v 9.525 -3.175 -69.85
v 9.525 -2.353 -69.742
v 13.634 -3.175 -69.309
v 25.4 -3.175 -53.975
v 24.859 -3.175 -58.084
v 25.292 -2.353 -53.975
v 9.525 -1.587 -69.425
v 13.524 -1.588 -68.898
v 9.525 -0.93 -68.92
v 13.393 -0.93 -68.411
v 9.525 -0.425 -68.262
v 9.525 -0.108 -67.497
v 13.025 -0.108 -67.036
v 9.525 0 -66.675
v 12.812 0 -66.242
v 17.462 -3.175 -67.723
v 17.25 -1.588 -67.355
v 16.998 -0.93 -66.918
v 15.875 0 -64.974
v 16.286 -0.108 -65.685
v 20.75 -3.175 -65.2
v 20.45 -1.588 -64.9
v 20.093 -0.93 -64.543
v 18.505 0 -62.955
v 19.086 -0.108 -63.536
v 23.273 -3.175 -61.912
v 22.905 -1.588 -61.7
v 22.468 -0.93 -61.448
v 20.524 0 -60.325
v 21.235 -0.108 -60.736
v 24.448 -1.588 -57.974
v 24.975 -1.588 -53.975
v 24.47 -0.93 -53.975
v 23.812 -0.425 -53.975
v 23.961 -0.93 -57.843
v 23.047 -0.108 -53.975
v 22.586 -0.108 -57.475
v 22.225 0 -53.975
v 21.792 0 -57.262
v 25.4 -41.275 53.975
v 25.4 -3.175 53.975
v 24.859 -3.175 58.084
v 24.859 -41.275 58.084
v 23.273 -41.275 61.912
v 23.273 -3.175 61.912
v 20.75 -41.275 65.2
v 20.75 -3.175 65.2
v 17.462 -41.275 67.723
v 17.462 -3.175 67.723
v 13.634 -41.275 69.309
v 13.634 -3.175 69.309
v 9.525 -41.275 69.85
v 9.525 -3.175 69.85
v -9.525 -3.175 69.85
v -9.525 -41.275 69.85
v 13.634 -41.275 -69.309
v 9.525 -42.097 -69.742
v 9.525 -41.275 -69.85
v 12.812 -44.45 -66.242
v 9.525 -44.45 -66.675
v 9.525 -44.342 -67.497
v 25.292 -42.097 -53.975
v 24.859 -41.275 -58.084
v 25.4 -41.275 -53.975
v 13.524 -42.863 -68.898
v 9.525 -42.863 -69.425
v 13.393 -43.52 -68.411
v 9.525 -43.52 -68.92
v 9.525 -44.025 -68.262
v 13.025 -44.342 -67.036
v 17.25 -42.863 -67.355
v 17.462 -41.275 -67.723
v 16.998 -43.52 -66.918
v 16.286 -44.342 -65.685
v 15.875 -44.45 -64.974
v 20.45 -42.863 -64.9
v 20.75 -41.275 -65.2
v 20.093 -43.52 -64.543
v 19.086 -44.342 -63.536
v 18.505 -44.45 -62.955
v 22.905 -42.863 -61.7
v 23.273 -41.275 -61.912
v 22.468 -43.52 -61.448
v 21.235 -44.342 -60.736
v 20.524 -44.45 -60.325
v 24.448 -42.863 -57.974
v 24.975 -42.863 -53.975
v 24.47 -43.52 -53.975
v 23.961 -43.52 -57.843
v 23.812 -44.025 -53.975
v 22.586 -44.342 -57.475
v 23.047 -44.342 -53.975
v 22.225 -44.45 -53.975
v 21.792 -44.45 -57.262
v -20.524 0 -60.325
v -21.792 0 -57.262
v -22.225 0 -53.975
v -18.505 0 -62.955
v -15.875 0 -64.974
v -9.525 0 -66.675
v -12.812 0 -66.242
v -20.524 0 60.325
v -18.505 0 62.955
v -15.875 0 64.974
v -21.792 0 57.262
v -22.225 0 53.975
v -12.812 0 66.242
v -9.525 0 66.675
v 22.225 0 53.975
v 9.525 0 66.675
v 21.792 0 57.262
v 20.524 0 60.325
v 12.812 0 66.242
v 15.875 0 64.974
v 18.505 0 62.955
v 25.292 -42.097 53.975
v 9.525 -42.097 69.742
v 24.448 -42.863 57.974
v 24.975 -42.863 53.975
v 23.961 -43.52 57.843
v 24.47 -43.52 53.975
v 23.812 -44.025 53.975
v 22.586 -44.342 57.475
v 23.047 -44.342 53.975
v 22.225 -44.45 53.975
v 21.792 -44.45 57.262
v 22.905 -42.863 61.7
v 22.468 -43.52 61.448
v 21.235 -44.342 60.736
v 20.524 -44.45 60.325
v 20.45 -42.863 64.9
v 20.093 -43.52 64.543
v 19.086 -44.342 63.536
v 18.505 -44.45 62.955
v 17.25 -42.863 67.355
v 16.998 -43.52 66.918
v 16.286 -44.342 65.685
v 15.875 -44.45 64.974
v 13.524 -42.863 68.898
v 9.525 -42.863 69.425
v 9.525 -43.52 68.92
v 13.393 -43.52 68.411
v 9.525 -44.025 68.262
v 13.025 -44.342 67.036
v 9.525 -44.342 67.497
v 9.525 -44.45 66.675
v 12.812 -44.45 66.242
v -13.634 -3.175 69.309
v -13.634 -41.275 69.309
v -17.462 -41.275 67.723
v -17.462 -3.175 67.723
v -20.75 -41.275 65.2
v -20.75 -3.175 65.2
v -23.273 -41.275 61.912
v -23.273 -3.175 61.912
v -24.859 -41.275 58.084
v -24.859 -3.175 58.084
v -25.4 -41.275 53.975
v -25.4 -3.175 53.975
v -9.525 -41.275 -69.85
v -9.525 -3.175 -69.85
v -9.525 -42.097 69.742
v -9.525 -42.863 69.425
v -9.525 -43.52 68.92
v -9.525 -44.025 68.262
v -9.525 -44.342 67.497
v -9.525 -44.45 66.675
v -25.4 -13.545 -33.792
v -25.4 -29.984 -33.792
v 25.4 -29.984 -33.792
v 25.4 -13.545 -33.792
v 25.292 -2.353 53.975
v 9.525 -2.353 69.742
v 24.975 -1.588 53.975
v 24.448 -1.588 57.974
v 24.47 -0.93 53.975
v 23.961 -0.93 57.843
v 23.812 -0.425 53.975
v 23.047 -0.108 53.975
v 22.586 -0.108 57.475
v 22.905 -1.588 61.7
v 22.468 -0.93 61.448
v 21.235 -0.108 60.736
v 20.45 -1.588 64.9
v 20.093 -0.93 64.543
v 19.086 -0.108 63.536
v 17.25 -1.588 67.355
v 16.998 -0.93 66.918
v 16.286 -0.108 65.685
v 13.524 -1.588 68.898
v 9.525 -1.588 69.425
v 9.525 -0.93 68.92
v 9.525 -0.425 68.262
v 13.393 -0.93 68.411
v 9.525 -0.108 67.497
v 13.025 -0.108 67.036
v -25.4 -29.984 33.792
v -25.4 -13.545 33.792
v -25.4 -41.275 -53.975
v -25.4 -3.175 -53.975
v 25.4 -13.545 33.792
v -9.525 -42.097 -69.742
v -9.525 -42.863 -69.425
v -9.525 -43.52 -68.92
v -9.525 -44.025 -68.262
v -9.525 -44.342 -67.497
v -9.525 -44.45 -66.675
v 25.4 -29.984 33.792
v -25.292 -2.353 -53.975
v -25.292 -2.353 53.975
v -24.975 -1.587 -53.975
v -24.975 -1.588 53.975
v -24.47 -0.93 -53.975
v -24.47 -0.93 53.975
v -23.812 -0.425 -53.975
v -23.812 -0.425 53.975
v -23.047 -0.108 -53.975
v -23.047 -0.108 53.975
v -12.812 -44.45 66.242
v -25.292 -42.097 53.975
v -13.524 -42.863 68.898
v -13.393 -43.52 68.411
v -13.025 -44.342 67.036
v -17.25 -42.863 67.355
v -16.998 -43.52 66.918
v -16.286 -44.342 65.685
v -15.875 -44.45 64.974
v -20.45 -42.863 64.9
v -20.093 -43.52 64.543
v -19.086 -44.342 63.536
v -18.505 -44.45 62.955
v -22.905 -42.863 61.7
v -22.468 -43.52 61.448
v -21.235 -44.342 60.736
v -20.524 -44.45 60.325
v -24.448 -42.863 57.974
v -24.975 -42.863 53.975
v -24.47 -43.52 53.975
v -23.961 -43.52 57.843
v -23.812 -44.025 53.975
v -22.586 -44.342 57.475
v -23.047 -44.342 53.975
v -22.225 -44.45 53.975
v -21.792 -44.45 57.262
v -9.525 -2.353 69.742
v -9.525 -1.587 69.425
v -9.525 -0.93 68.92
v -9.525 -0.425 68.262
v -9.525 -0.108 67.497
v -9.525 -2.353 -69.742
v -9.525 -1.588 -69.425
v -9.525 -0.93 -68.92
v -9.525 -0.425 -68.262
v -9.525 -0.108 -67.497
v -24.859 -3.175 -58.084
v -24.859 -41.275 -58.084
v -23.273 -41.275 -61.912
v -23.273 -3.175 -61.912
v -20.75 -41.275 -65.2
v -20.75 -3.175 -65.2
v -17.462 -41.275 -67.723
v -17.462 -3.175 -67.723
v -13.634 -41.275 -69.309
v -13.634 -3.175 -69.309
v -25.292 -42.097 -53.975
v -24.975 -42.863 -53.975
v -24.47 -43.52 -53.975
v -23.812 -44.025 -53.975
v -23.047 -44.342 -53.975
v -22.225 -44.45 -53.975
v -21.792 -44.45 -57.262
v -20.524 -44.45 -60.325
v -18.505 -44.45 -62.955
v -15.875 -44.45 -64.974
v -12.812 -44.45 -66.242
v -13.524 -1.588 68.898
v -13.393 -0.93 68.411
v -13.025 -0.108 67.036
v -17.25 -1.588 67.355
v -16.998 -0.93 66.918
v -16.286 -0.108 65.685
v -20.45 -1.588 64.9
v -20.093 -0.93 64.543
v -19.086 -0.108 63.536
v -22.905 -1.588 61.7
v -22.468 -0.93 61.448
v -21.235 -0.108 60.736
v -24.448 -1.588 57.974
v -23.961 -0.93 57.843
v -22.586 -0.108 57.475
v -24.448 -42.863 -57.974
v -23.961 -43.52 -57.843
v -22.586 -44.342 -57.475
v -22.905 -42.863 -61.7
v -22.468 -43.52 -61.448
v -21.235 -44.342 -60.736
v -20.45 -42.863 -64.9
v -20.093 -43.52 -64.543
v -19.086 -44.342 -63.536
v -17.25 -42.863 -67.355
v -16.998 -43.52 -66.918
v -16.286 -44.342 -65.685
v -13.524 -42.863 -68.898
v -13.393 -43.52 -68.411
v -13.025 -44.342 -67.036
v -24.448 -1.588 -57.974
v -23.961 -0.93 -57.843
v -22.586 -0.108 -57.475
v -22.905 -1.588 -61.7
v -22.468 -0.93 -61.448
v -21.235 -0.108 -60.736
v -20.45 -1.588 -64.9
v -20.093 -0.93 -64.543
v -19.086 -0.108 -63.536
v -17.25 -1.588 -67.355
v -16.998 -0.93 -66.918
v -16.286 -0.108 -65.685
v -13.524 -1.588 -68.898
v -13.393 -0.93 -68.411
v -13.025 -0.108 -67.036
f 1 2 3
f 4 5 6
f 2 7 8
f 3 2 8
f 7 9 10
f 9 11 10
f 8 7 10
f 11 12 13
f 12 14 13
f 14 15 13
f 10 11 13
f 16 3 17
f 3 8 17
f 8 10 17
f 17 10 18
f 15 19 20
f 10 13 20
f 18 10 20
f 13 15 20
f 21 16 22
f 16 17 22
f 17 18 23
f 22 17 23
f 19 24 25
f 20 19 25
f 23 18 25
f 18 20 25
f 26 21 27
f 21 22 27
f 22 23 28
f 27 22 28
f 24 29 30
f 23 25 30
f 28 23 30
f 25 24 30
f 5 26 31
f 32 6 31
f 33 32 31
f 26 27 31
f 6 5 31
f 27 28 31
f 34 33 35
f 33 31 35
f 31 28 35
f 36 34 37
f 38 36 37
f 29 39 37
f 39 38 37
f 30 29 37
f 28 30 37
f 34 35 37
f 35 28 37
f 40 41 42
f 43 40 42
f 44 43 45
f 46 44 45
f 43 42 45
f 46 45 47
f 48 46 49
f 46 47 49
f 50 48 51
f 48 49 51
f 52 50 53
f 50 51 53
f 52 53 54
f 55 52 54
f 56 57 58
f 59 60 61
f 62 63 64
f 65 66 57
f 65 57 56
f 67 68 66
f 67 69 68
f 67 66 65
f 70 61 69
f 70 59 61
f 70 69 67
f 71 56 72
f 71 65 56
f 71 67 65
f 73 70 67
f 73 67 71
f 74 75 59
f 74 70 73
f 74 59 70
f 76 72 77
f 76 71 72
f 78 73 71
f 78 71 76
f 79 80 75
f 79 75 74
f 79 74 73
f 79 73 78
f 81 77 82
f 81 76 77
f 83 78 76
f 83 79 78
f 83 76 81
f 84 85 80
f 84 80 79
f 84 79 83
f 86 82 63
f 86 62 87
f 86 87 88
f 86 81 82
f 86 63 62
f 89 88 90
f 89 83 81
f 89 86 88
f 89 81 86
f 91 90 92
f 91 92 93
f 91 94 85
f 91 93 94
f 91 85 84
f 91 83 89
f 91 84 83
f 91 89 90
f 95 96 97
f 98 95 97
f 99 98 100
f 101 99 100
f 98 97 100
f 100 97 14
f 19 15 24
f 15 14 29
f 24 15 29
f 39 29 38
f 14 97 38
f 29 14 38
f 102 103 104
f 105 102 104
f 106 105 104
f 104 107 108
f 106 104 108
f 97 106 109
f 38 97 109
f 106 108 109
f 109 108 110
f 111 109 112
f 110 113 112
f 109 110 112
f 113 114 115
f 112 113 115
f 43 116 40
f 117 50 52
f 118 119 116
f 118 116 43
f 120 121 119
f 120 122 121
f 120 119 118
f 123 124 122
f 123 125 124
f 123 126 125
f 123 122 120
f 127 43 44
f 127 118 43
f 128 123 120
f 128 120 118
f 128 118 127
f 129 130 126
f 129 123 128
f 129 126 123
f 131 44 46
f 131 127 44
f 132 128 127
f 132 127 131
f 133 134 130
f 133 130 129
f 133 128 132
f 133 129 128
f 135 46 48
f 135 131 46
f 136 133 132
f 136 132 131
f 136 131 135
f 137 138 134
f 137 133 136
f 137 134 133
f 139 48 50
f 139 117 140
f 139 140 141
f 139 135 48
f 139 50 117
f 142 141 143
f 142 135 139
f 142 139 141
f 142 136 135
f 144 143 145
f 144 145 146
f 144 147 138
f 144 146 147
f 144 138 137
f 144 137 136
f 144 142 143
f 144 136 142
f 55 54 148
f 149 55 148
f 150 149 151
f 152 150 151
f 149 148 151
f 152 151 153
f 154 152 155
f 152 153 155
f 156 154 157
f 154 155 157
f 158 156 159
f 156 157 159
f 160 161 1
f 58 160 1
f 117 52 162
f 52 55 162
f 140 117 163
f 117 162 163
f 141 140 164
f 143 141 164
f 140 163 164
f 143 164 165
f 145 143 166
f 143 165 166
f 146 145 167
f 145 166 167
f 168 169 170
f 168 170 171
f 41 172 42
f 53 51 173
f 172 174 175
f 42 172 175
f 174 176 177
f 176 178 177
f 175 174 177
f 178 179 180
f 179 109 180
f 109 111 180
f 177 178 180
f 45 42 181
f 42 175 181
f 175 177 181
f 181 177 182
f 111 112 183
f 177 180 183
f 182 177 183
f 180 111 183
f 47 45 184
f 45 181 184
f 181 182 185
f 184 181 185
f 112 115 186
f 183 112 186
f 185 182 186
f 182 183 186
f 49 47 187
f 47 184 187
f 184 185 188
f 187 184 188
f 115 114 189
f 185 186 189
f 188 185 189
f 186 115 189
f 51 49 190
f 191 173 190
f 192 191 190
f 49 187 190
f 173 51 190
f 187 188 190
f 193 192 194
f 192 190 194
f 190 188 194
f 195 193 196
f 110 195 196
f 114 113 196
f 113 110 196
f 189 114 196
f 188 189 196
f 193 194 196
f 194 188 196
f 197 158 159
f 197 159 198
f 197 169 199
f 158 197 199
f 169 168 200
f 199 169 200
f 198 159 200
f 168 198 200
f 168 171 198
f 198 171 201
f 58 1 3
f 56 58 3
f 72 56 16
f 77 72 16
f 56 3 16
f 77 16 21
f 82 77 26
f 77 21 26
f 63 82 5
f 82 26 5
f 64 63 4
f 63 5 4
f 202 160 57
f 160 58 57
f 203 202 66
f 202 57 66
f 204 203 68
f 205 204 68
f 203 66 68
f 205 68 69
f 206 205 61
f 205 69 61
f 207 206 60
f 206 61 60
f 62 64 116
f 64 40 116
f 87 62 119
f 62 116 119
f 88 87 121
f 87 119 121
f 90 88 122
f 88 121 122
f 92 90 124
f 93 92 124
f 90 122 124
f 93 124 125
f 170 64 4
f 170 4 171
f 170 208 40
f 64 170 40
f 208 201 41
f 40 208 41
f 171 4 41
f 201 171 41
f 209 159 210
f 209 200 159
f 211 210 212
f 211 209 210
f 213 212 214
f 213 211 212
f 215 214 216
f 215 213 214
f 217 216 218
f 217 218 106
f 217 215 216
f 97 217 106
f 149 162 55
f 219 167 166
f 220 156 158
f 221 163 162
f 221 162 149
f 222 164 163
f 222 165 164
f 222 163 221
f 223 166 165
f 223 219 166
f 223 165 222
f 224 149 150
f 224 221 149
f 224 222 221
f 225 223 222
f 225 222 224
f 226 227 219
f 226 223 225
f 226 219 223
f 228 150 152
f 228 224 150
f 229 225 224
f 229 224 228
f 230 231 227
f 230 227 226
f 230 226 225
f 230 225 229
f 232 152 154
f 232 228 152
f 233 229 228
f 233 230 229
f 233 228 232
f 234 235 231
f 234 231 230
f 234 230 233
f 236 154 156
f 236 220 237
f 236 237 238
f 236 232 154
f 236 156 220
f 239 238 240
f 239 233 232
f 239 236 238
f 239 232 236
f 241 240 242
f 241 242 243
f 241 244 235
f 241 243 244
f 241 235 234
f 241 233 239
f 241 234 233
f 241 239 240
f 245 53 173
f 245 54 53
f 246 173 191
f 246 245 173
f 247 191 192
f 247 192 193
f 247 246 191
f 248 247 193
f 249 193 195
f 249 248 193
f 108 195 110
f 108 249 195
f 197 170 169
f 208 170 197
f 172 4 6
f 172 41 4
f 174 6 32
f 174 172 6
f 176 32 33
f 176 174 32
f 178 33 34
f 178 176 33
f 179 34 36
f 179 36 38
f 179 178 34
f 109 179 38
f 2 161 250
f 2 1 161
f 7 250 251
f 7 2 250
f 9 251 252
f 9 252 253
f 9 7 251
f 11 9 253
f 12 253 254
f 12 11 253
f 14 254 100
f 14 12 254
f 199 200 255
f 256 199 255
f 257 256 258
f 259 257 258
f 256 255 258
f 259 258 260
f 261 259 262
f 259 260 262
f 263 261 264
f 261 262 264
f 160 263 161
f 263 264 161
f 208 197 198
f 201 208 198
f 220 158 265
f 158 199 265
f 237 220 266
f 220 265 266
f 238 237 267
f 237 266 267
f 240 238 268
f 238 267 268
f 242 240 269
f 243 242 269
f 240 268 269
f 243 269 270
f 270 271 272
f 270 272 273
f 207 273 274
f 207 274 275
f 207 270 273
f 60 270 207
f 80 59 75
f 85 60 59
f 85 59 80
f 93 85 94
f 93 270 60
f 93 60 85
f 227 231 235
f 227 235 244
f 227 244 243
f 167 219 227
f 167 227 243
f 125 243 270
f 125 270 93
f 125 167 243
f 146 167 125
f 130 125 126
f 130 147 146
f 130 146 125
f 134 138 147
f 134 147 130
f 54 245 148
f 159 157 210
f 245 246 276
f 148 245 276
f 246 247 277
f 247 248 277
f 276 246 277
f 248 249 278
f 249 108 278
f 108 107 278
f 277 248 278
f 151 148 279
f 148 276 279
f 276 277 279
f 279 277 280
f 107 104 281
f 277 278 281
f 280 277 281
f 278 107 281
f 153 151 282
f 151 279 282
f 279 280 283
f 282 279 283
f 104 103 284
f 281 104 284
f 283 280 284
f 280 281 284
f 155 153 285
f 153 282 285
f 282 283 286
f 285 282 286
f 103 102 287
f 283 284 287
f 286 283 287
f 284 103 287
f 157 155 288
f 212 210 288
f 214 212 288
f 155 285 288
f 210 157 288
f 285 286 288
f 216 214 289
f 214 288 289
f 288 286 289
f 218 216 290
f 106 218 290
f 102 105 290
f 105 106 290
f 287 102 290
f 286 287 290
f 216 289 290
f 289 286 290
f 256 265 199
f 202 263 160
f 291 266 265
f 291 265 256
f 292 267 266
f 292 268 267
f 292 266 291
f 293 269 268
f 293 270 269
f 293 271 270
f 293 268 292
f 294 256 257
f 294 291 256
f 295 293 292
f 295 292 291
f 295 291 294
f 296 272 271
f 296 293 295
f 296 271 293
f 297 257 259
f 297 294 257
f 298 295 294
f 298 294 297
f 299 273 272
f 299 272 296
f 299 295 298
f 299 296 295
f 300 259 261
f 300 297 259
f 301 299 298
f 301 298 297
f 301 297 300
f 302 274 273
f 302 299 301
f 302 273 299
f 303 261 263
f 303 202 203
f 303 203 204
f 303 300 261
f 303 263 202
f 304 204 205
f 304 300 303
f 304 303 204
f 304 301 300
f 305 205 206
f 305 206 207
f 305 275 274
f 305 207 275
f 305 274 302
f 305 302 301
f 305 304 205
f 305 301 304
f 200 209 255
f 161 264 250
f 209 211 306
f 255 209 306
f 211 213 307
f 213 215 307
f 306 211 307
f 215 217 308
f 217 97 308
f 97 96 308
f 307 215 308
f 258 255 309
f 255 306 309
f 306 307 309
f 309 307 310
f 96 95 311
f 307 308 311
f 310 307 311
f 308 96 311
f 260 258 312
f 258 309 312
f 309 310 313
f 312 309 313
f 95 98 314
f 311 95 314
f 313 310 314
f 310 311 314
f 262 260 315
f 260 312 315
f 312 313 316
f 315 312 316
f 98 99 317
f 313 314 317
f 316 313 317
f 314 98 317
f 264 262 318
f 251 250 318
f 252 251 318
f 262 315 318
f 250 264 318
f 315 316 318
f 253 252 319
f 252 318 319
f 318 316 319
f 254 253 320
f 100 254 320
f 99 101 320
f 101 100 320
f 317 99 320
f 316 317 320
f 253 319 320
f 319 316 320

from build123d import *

# Parameters (mm, degrees)
F1_DEPTH = 44.45
F2_R     = 3.175
F3_W     = 16.439201
F3_H     = 67.583382
F4_DEPTH = 50.801


with BuildPart() as f1:
    # F0 (on Front) → F1 (new body)
    with BuildSketch(Plane.XZ):
        with BuildLine():
            ThreePointArc((25.4, 53.975), (20.75032, 65.20032), (9.525, 69.85))
            Line((9.525, 69.85), (-9.525, 69.85))
            ThreePointArc((-9.525, 69.85), (-20.75032, 65.20032), (-25.4, 53.975))
            Line((-25.4, 53.975), (-25.4, -53.975))
            ThreePointArc((-25.4, -53.975), (-20.75032, -65.20032), (-9.525, -69.85))
            Line((-9.525, -69.85), (9.525, -69.85))
            ThreePointArc((9.525, -69.85), (20.75032, -65.20032), (25.4, -53.975))
            Line((25.4, -53.975), (25.4, 53.975))
        make_face()
    extrude(amount=F1_DEPTH)

    # F2
    f2_edges = [f1.edges().sort_by_distance(p)[0] for p in [
        (20.75032, -44.45, 65.20032),
        (20.75032, 0, 65.20032),
    ]]
    fillet(f2_edges, radius=F2_R)

    # F3 (on face) → F4 (cut, through all)
    with BuildSketch(Plane.YZ.offset(25.4)):
        with Locations((-21.764164, 0)):
            Rectangle(F3_W, F3_H)
    extrude(amount=-F4_DEPTH, mode=Mode.SUBTRACT)


solid = f1.part
